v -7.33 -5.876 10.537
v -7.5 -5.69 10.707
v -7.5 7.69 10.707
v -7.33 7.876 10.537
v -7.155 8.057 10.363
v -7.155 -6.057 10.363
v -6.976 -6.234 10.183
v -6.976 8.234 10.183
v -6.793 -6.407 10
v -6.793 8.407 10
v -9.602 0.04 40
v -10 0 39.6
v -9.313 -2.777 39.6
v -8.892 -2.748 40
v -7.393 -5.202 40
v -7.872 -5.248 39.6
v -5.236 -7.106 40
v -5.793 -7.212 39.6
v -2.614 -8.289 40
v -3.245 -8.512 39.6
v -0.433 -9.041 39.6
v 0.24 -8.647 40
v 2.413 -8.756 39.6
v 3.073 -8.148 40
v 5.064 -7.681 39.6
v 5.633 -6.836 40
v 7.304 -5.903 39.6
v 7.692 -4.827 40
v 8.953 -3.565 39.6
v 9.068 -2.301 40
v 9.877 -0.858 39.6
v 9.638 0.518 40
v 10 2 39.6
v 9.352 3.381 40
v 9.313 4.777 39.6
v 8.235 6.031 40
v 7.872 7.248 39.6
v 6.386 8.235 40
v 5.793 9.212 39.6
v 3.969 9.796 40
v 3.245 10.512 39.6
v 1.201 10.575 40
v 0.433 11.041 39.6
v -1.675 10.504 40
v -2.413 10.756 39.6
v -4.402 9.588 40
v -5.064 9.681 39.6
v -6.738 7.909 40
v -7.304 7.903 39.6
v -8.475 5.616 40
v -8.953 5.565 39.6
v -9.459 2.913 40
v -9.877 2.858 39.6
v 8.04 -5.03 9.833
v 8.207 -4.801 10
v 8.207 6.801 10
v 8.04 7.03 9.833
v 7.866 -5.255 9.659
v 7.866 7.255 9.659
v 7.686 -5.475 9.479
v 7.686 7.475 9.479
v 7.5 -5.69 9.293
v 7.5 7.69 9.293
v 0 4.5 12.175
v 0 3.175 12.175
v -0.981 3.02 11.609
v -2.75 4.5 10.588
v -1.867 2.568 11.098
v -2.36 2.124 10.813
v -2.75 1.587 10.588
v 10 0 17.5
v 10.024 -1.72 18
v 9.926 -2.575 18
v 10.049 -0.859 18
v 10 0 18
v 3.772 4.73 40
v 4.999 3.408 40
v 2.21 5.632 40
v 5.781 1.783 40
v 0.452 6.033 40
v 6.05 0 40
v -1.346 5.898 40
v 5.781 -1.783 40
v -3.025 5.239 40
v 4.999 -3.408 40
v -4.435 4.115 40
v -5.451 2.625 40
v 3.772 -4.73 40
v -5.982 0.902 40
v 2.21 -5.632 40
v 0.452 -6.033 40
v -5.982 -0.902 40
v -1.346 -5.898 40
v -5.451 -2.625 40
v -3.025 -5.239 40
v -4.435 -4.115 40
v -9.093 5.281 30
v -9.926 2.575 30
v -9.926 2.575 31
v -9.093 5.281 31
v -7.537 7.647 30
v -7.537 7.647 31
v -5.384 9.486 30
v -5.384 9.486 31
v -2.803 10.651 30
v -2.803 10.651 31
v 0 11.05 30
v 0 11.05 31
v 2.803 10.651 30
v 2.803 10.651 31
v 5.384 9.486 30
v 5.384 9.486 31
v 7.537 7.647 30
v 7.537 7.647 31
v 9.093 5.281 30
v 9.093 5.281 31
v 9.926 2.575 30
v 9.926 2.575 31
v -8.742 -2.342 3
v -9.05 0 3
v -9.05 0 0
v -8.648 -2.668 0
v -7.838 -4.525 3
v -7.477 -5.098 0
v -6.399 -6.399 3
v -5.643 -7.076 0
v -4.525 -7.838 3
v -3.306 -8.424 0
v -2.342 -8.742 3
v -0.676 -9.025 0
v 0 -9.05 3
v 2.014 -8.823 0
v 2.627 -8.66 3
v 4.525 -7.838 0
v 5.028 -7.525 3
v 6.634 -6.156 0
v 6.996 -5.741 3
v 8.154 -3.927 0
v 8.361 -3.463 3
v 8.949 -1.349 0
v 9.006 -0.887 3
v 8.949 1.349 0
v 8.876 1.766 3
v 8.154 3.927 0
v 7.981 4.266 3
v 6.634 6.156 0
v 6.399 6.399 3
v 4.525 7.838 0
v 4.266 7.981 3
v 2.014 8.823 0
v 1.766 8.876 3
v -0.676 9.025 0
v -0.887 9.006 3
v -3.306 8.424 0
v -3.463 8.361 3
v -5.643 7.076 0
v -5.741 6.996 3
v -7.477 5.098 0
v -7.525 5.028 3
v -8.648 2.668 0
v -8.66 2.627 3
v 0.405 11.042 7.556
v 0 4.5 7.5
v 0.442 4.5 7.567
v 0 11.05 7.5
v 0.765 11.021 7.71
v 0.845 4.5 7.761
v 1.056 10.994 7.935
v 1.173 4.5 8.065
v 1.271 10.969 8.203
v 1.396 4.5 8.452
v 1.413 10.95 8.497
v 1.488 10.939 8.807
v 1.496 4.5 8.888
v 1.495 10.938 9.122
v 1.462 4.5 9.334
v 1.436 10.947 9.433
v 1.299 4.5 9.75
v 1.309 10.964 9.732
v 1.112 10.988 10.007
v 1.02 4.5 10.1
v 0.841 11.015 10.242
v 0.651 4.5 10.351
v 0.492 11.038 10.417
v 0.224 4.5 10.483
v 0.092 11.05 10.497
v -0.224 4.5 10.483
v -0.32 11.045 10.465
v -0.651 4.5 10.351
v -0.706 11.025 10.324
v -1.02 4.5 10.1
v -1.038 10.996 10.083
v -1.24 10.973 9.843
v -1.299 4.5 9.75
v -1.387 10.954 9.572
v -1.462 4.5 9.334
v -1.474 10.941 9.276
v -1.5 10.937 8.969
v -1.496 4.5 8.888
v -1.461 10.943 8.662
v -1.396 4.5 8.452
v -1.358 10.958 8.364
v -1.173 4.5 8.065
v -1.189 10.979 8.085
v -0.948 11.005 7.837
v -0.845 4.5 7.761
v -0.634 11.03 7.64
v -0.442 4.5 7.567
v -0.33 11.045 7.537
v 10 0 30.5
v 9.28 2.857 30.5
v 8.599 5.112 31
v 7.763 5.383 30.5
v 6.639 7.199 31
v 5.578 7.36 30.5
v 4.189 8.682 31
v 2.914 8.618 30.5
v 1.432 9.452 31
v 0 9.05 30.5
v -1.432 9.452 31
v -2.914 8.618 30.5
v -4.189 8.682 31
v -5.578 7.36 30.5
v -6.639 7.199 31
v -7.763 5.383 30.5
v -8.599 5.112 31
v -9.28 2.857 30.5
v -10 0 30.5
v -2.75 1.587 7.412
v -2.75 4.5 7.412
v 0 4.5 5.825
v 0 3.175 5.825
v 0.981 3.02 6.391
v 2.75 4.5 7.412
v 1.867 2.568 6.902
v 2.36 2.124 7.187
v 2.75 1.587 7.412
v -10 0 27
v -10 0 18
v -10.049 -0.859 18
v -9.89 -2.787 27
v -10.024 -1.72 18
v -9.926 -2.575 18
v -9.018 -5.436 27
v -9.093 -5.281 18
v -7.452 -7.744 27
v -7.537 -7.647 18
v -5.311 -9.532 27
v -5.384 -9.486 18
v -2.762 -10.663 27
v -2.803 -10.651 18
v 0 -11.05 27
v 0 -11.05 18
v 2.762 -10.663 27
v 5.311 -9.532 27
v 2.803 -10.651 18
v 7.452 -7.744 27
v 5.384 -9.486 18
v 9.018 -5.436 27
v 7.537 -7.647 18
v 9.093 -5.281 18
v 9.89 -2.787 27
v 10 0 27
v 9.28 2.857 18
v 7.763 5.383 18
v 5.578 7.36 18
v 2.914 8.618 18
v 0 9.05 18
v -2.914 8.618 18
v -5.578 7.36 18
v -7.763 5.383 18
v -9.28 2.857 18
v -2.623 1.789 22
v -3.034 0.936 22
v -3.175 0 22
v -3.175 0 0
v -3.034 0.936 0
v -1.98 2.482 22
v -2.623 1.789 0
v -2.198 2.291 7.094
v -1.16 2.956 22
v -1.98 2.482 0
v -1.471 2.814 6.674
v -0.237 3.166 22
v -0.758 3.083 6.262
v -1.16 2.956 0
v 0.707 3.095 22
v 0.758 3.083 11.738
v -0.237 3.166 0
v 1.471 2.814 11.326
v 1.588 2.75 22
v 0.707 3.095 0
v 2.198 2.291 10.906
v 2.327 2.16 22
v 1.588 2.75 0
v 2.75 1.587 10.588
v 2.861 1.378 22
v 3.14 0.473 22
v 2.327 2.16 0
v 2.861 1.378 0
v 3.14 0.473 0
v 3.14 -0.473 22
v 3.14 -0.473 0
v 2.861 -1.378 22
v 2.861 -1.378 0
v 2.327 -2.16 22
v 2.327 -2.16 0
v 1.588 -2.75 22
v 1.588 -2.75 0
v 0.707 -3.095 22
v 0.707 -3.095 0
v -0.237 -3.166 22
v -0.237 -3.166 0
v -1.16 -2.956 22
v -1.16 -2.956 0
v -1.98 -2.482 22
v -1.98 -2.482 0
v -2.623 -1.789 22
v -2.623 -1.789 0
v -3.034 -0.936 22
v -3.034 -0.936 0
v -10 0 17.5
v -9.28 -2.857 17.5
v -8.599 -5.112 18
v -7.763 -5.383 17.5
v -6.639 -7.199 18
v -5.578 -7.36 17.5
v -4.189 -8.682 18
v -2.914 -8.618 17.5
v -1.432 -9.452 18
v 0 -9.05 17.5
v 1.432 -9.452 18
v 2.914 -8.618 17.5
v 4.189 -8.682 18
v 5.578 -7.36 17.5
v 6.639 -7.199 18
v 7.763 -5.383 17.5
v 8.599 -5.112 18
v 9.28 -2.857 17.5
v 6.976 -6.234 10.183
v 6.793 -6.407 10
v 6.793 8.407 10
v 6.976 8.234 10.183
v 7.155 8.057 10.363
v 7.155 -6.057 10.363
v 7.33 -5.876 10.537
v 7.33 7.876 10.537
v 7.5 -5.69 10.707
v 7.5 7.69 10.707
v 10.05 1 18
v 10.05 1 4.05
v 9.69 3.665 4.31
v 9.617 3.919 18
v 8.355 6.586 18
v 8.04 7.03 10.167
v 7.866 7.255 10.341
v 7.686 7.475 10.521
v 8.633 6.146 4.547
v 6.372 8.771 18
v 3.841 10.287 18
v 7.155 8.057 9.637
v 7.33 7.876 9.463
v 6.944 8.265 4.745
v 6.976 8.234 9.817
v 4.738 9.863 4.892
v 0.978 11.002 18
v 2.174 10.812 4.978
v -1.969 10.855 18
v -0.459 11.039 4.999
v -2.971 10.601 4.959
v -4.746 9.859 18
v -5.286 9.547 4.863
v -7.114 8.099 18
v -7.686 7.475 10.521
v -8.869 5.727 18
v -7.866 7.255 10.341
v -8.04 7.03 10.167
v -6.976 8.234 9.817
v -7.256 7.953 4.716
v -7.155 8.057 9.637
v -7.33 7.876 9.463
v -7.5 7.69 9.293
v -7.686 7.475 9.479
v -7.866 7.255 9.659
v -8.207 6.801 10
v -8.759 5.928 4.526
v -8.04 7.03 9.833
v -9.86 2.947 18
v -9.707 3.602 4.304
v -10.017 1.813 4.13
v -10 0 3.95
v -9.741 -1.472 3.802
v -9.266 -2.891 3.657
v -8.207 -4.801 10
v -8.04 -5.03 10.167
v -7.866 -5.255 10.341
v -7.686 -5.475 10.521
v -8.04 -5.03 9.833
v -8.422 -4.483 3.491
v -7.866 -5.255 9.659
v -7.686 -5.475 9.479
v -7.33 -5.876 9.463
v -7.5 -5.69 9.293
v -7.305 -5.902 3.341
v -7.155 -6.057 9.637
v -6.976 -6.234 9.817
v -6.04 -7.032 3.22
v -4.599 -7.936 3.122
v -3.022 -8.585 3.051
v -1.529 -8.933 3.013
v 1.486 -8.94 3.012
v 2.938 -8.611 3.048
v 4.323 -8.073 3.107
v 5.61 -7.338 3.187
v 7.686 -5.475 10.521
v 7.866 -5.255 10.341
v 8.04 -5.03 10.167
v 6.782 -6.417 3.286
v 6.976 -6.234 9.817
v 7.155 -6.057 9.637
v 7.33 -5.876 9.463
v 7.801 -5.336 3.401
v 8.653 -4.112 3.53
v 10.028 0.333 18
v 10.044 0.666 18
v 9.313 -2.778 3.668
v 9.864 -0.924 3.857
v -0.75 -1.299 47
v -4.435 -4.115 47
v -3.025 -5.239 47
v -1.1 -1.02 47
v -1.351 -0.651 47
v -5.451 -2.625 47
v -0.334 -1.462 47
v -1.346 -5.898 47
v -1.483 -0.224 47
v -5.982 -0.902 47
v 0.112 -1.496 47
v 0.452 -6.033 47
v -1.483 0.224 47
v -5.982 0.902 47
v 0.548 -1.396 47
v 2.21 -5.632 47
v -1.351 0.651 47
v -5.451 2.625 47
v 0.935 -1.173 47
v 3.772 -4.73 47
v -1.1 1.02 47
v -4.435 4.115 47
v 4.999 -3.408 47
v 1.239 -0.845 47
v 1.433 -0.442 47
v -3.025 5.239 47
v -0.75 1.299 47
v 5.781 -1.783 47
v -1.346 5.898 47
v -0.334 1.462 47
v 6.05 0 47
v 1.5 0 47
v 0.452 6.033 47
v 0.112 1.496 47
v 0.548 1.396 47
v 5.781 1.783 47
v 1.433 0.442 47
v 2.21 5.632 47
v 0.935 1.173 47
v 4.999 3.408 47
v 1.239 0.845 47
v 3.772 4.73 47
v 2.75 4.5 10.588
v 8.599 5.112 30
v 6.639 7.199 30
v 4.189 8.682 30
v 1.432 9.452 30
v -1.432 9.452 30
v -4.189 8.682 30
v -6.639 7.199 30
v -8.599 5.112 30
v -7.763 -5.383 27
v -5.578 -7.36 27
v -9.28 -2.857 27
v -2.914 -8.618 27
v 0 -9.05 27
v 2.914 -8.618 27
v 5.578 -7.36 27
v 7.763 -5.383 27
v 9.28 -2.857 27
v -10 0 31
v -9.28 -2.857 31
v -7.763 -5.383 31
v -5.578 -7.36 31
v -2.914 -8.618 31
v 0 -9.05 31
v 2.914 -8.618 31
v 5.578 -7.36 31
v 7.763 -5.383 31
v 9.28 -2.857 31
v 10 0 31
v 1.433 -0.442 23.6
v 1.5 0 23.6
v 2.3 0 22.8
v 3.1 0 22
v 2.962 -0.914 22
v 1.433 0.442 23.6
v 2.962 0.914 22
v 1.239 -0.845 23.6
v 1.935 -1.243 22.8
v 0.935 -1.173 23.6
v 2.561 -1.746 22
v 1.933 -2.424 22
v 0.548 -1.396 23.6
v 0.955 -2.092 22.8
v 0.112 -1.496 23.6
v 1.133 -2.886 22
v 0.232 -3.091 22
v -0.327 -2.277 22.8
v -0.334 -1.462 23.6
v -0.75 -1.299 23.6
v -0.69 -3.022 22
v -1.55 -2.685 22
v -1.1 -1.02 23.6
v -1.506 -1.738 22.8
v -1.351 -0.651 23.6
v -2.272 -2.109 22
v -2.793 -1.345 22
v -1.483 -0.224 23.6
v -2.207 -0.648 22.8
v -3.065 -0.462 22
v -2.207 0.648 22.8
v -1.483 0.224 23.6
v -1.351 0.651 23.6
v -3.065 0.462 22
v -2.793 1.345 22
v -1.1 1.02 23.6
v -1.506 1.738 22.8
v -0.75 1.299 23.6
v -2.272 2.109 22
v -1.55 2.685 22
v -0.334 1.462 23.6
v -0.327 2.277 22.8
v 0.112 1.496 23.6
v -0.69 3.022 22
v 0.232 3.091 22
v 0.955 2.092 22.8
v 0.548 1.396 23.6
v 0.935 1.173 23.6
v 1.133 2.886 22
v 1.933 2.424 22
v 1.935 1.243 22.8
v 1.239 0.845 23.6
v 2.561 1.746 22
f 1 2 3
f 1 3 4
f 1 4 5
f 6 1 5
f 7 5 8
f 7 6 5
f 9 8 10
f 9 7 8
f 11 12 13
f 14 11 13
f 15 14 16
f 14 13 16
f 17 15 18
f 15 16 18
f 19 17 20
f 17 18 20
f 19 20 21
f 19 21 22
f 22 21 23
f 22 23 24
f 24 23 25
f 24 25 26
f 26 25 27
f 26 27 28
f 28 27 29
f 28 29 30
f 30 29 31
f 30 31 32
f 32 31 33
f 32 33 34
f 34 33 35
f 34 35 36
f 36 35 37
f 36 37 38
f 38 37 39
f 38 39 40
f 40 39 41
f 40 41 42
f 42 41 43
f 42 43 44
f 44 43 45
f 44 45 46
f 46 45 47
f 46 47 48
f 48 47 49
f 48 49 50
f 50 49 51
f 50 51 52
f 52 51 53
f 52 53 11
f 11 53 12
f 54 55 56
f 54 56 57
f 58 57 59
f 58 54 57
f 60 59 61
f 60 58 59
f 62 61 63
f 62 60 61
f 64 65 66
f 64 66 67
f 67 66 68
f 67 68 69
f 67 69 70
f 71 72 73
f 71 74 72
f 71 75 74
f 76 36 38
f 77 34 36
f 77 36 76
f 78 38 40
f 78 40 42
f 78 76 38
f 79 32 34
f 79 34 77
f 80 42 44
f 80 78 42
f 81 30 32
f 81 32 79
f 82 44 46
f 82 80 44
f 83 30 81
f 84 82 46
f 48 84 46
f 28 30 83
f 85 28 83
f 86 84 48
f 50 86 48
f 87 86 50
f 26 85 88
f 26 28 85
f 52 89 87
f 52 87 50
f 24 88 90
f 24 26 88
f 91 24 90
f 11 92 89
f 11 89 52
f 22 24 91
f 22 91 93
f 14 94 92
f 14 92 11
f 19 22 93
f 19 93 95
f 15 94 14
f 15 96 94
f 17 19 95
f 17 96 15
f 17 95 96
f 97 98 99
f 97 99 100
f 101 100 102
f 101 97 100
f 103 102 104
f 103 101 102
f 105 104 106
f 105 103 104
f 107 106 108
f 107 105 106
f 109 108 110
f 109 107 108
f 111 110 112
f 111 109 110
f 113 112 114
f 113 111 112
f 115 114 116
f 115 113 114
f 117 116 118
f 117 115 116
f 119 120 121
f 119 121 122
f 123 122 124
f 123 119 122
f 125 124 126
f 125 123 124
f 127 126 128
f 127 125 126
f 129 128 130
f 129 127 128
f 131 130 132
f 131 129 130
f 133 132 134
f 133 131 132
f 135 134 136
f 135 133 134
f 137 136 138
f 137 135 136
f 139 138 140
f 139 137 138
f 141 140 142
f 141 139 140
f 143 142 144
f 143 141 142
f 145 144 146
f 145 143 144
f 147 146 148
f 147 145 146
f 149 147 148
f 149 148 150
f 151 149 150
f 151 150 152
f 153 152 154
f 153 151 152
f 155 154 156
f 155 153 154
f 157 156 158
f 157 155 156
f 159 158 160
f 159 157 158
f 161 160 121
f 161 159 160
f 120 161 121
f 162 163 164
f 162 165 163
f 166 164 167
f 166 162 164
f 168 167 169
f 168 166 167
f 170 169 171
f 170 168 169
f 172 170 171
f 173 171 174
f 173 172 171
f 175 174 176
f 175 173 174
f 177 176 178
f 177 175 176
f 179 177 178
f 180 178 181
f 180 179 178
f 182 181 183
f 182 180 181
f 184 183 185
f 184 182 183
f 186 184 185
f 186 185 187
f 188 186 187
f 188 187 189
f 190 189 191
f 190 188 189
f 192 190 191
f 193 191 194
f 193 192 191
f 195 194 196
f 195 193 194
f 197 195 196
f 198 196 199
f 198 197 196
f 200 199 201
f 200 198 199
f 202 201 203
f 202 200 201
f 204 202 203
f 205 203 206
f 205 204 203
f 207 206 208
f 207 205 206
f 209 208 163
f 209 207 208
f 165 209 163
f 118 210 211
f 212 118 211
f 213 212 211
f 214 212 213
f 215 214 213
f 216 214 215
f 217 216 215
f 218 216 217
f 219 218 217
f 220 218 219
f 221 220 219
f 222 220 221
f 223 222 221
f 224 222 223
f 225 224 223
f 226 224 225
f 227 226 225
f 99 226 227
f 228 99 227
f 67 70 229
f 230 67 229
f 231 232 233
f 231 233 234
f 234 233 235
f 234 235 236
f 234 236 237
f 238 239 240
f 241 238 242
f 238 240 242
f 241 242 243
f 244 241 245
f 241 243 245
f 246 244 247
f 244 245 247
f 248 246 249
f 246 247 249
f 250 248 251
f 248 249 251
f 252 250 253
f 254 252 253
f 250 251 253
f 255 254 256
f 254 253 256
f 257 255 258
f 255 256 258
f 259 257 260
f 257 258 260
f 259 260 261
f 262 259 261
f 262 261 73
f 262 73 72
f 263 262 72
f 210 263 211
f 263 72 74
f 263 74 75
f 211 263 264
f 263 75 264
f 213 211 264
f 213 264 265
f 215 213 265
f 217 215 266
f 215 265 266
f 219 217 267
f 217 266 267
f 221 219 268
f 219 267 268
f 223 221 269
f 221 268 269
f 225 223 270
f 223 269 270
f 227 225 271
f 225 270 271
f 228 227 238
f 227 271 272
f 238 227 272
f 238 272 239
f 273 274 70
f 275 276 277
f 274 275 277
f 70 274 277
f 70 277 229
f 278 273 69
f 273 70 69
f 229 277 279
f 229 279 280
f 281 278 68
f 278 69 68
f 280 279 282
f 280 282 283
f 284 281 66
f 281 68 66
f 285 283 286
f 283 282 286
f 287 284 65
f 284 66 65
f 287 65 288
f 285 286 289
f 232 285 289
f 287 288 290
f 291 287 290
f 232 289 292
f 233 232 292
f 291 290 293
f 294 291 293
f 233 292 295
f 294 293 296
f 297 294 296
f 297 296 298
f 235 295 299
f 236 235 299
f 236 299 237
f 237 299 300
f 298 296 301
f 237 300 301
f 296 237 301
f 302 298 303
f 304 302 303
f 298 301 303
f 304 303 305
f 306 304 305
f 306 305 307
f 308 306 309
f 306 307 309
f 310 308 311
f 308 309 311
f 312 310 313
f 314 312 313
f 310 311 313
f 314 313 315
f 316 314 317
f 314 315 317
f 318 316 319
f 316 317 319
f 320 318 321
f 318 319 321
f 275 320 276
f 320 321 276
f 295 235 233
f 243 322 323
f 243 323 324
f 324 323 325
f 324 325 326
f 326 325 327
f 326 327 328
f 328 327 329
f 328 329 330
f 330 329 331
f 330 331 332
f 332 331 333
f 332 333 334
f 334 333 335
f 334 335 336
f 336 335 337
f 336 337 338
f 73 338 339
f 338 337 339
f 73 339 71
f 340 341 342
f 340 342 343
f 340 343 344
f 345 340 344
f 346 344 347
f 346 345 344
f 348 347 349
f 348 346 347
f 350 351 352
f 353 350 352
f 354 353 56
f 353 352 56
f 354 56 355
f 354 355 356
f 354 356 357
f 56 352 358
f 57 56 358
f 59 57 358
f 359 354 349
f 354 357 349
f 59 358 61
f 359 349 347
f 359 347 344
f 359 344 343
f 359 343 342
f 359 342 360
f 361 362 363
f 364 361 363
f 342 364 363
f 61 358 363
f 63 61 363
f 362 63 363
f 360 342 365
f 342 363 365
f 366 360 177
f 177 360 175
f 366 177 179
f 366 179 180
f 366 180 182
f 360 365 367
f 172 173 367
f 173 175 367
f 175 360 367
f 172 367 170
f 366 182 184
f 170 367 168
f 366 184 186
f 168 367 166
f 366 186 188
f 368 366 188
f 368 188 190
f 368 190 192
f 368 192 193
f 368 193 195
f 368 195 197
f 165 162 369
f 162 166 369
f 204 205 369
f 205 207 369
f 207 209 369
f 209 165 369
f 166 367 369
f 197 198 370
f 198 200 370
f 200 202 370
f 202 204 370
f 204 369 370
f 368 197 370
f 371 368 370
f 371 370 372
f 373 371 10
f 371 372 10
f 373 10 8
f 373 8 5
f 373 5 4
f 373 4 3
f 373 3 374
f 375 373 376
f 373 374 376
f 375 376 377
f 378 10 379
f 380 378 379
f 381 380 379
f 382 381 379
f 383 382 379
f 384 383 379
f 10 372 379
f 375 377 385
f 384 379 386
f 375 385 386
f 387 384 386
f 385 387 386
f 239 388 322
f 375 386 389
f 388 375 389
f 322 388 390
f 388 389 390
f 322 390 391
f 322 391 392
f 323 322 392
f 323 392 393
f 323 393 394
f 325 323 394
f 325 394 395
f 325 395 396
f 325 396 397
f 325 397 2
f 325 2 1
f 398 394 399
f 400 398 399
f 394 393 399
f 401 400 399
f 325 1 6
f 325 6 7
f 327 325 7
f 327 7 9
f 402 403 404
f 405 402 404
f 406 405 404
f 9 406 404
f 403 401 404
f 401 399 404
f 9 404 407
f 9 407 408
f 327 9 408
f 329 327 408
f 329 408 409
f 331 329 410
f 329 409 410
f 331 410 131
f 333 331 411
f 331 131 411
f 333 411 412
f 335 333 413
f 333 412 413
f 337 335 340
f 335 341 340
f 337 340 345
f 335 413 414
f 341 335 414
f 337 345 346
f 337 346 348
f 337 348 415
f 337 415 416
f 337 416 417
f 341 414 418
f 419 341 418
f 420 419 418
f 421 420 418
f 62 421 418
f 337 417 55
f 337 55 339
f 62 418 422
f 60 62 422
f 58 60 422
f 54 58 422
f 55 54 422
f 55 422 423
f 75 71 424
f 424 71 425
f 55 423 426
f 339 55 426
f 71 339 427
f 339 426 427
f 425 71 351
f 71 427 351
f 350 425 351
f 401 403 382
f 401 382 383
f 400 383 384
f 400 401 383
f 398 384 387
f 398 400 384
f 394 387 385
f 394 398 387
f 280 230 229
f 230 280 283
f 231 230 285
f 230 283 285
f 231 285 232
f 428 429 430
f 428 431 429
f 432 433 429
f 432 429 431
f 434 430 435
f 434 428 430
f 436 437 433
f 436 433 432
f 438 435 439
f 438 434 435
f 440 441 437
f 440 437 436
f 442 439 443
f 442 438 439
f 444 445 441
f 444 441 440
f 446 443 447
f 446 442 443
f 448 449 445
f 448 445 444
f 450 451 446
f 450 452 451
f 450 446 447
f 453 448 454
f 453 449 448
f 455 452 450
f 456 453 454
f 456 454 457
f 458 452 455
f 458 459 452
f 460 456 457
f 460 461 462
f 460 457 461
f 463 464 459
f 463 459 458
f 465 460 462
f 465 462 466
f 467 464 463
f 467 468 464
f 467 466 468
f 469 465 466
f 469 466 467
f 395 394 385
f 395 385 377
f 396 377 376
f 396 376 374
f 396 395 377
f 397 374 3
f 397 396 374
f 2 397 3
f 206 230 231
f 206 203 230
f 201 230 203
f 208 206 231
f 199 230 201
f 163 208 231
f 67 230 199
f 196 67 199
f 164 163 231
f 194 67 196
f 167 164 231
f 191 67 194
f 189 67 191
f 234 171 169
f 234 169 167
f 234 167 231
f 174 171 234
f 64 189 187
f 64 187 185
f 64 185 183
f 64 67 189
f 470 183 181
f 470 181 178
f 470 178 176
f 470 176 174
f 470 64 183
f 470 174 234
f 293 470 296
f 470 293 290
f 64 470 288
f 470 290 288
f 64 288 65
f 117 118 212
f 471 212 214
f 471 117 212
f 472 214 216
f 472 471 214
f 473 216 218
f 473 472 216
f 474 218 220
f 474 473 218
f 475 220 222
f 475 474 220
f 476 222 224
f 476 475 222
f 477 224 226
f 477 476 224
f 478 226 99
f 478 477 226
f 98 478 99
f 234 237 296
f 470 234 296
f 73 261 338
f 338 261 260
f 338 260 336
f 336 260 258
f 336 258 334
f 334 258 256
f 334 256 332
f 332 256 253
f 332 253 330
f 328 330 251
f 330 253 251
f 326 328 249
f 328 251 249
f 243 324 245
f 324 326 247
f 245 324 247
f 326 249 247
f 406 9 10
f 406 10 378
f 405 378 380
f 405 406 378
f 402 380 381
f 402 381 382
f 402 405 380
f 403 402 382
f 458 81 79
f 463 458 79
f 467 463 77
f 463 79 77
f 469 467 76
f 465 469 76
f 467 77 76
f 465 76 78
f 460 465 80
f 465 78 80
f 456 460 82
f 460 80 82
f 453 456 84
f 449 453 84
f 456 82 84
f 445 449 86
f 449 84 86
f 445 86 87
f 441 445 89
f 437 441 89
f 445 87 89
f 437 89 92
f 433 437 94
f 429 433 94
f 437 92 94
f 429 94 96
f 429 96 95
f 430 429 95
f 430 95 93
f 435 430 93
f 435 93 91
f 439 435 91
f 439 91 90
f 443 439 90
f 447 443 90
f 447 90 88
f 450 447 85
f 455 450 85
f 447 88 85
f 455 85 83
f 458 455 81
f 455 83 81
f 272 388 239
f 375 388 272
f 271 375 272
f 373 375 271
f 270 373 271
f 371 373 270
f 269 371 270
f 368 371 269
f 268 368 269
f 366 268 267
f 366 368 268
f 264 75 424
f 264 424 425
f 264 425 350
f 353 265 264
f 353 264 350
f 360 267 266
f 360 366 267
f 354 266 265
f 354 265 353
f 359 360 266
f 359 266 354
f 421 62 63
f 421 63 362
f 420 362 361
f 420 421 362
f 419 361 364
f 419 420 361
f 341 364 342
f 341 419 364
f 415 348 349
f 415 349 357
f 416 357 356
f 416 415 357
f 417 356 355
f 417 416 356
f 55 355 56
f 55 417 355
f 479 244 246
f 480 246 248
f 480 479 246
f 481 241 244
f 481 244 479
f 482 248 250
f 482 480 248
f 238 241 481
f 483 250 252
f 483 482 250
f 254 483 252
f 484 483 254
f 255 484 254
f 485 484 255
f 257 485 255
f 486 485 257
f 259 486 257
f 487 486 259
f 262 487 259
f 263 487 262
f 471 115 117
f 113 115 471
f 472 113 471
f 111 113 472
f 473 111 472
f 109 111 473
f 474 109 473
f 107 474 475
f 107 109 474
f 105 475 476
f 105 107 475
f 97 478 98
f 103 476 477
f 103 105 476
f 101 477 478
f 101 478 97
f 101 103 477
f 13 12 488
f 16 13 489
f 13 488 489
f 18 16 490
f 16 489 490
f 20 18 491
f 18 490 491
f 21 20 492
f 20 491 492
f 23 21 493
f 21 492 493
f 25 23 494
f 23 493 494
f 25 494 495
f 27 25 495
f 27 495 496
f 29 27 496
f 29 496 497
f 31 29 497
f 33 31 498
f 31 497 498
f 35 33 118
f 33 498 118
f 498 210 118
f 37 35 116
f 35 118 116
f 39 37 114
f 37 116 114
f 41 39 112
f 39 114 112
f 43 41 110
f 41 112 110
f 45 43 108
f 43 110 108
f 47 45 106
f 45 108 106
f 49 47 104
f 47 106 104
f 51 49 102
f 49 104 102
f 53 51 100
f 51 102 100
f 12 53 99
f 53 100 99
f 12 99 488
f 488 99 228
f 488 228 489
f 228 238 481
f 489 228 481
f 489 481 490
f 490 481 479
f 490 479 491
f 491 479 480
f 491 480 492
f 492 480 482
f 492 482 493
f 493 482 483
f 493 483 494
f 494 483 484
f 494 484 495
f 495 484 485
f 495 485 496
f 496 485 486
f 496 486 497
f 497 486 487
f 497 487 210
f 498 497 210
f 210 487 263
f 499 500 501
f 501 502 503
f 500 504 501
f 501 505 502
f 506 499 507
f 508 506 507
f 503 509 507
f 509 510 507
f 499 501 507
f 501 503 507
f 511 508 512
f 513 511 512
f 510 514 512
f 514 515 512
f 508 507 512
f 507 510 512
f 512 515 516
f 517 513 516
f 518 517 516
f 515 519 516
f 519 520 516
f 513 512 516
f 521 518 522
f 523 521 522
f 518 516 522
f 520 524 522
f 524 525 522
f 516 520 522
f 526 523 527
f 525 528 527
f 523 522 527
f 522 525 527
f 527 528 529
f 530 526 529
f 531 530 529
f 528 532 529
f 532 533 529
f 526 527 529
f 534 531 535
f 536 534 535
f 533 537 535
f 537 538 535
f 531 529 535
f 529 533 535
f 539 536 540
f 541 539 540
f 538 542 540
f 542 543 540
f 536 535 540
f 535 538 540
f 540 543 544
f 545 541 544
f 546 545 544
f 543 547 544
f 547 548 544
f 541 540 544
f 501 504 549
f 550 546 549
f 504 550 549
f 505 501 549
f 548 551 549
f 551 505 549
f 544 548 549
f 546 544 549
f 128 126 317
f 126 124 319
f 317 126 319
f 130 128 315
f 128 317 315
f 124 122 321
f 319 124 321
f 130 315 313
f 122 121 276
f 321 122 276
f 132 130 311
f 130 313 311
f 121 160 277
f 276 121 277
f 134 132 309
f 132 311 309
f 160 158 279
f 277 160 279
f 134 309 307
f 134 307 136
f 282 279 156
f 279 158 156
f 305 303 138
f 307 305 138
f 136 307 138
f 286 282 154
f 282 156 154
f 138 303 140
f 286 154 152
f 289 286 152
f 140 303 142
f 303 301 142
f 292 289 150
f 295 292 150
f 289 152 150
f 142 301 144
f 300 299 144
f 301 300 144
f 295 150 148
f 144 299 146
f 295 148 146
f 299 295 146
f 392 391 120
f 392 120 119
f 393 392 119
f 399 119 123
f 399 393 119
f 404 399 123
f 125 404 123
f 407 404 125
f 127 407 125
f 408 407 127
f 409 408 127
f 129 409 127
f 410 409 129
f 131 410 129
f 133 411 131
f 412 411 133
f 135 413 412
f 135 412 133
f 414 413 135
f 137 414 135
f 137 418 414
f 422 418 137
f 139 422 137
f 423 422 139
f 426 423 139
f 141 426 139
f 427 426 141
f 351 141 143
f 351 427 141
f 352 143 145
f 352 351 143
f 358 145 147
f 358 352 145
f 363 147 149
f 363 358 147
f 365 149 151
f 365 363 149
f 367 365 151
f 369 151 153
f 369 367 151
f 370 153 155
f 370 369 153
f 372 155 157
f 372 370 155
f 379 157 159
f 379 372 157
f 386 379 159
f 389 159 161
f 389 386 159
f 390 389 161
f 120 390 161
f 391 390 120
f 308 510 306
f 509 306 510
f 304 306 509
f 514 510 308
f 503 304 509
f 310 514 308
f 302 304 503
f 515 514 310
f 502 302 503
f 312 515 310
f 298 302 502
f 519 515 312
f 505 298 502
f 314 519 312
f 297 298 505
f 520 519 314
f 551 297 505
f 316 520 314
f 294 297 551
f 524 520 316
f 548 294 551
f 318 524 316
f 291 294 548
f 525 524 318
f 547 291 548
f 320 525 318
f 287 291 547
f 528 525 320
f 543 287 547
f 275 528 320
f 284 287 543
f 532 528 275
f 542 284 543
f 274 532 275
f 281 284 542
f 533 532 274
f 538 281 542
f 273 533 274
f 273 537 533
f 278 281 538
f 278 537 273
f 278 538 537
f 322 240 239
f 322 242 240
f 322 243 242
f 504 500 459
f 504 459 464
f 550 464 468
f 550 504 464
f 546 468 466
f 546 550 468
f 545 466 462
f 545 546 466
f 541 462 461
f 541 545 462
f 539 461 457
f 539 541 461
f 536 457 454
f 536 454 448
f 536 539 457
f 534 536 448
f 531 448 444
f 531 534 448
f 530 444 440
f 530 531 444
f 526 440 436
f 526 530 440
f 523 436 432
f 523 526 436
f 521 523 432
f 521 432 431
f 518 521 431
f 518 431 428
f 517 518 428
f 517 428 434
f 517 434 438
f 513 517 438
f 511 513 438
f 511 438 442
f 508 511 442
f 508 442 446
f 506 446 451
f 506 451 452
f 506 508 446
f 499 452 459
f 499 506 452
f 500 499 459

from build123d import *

# Parameters (mm, degrees)
SKETCH1_R             = 10.05
SKETCH1_R_2           = 1.5
EXTRUSION1_DEPTH      = 18
SKETCH2_R             = 10.05
SKETCH2_R_2           = 1.5
EXTRUSION2_DEPTH      = 13
SKETCH3_R             = 10.05
SKETCH3_R_2           = 1.5
EXTRUSION3_DEPTH      = 9
EXTRUSION4_START      = -4
EXTRUSION4_DEPTH      = 4
SKETCH5_R             = 6.05
SKETCH5_R_2           = 1.5
EXTRUSION5_DEPTH      = 7
SKETCH6_R             = 3.175
SKETCH6_R_2           = 1.5
EXTRUSION6_DEPTH      = 22
EXTRUSION7_DEPTH      = 4.5
SKETCH8_W             = 1.5
SKETCH8_H             = 11.05
EXTRUSION8_DEPTH      = 50.316376633
EXTRUSION8_DEPTH_BACK = 50.316376633
CHAMFER1_SIZE         = 0.4
SKETCH12_W            = 4
SKETCH12_H            = 3
CHAMFER2_SIZE         = 1.6
CHAMFER3_SIZE         = 0.5
CHAMFER4_SIZE         = 0.5
EXTRUSION10_START     = 1
EXTRUSION10_DEPTH     = 1


with BuildPart() as part:
    # Sketch1 → Extrusion1 (new body)
    with BuildSketch(Plane.XY):
        with Locations((0, 1)):
            Circle(SKETCH1_R)
        Circle(SKETCH1_R_2, mode=Mode.SUBTRACT)
    extrude(amount=EXTRUSION1_DEPTH)

    # Sketch2 → Extrusion2 (add)
    with BuildSketch(Plane(origin=(0, 1, 18), x_dir=(1, 0, 0), z_dir=(0, 0, 1))):
        with Locations(Location((0, -2, 0), (0, 0, 174.289477772))):
            Circle(SKETCH2_R)
        with Locations((0, -1)):
            Circle(SKETCH2_R_2, mode=Mode.SUBTRACT)
    extrude(amount=EXTRUSION2_DEPTH)

    # Sketch3 → Extrusion3 (add)
    with BuildSketch(Plane(origin=(0, -1, 31), x_dir=(1, 0, 0), z_dir=(0, 0, 1))):
        with Locations(Location((0, 2, 0), (0, 0, 185.710522228))):
            Circle(SKETCH3_R)
        with Locations((0, 1)):
            Circle(SKETCH3_R_2, mode=Mode.SUBTRACT)
    extrude(amount=EXTRUSION3_DEPTH)

    # Sketch4 → Extrusion4 (cut)
    with BuildSketch(Plane(origin=(0, 1, 31), x_dir=(1, 0, 0), z_dir=(0, 0, 1)).offset(EXTRUSION4_START)):
        with BuildLine():
            ThreePointArc((-10.000124999, -1), (0, -12.05), (10.000124999, -1))
            ThreePointArc((10.000124999, -1), (0, -10.05), (-10.000124999, -1))
        make_face()
    extrude(amount=EXTRUSION4_DEPTH, mode=Mode.SUBTRACT)

    # Sketch5 → Extrusion5 (add)
    with BuildSketch(Plane(origin=(0, 1, 40), x_dir=(1, 0, 0), z_dir=(0, 0, 1))):
        with Locations((0, -1)):
            Circle(SKETCH5_R)
        with Locations((0, -1)):
            Circle(SKETCH5_R_2, mode=Mode.SUBTRACT)
    extrude(amount=EXTRUSION5_DEPTH)

    # Sketch6 → Extrusion6 (cut)
    with BuildSketch(Plane(origin=(0, 1, 0), x_dir=(-1, 0, 0), z_dir=(0, 0, -1))):
        with Locations((0, -1)):
            Circle(SKETCH6_R)
        with Locations((0, -1)):
            Circle(SKETCH6_R_2, mode=Mode.SUBTRACT)
    extrude(amount=-EXTRUSION6_DEPTH, mode=Mode.SUBTRACT)

    # Sketch7 → Extrusion7 (cut)
    with BuildSketch(Plane(origin=(0, 0, 0), x_dir=(-1, 0, 0), z_dir=(0, 1, 0))):
        Polygon((-2.75, 7.41228676), (-2.75, 10.58771324), (0, 12.175426481), (2.75, 10.58771324), (2.75, 7.41228676), (0, 5.824573519), align=None)
    extrude(amount=EXTRUSION7_DEPTH, mode=Mode.SUBTRACT)

    # Sketch8 → Hole2 (revolve, cut)
    with BuildSketch(Plane(origin=(0, 0, 9), x_dir=(0, 0, -1), z_dir=(1, 0, 0))):
        with Locations((0.75, 5.525)):
            Rectangle(SKETCH8_W, SKETCH8_H)
    revolve(axis=Axis((0, 110, 9), (0, -1, 0)), mode=Mode.SUBTRACT)

    # Sketch10 → Extrusion8 (cut, two sides: drawn at the far end of the back side and taken through both)
    with BuildSketch(Plane(origin=(0, 0, 0), x_dir=(-1, 0, 0), z_dir=(0, 1, 0)).offset(-EXTRUSION8_DEPTH_BACK)):
        Polygon((-7.5, 10.707106781), (-8.207106781, 10), (-7.5, 9.292893219), (-6.792893219, 10), align=None)
        Polygon((7.5, 10.707106781), (6.792893219, 10), (7.5, 9.292893219), (8.207106781, 10), align=None)
    extrude(amount=EXTRUSION8_DEPTH + EXTRUSION8_DEPTH_BACK, mode=Mode.SUBTRACT)

    # Chamfer1
    chamfer1_edges = [part.edges().sort_by_distance(p)[0] for p in [
        (10.000124999, 2, 40),
    ]]
    chamfer(chamfer1_edges, length=CHAMFER1_SIZE)

    # Sketch12 → Revolution1 (revolve, cut)
    with BuildSketch(Plane.YZ, mode=Mode.PRIVATE) as revolution1_sk:
        with Locations((-11.05, 1.5)):
            Rectangle(SKETCH12_W, SKETCH12_H)
        Polygon((-9.05, 3), (-13.05, 7), (-13.05, 3), align=None)
    revolve(revolution1_sk.sketch.rotate(Axis((0, 0, -4.4), (0, 0, 1)), 270), axis=Axis((0, 0, -4.4), (0, 0, 1)), mode=Mode.SUBTRACT)

    # Chamfer2
    chamfer2_edges = [part.edges().sort_by_distance(p)[0] for p in [
        (-1.5, 0, 22),
    ]]
    chamfer(chamfer2_edges, length=CHAMFER2_SIZE)

    # Chamfer3
    # the kernel refuses this chamfer: 0.5 mm, written as the material it adds along each edge
    with BuildSketch(Plane(origin=(0, -1, 31), x_dir=(0.9995951137043791, -0.028453622938550055, 0), z_dir=(-0.028453622938550055, -0.9995951137043791, 0))) as chamfer3_piece_1_section:
        Polygon((10.05, -CHAMFER3_SIZE), (10.05 + CHAMFER3_SIZE, 0), (10.05, 0), align=None)
    chamfer3_piece_1 = revolve(axis=Axis((0, -1, 31), (0, 0, 1)), revolution_arc=183.260985134, mode=Mode.PRIVATE)
    chamfer3_piece_1 = chamfer3_piece_1 & Plane(origin=(0, 1, 30.761134514), x_dir=(-0.9950373133554516, -0.09950248755867733, 0), z_dir=(0, 0, -1)) * Cylinder(10.05, 43, mode=Mode.PRIVATE)
    add(chamfer3_piece_1)

    # Chamfer4
    # the kernel refuses this chamfer: 0.5 mm, written as the material it adds along each edge
    with BuildSketch(Plane(origin=(0, 1, 18), x_dir=(-0.9995951137044771, 0.028453622935110102, 0), z_dir=(0.028453622935110102, 0.9995951137044771, 0))) as chamfer4_piece_1_section:
        Polygon((10.05 + CHAMFER4_SIZE, 0), (10.05, -CHAMFER4_SIZE), (10.05, 0), align=None)
    chamfer4_piece_1 = revolve(axis=Axis((0, 1, 18), (0, 0, 1)), revolution_arc=183.260985134, mode=Mode.PRIVATE)
    chamfer4_piece_1 = chamfer4_piece_1 & Plane(origin=(0, -1, 17.760783503), x_dir=(-0.9950373133554516, 0.09950248755867756, 0), z_dir=(0, 0, -1)) * Cylinder(10.05, 43, mode=Mode.PRIVATE)
    add(chamfer4_piece_1)

    # Sketch13 → Extrusion10 (add)
    with BuildSketch(Plane(origin=(0, -1, 31), x_dir=(-1, 0, 0), z_dir=(0, 0, -1)).offset(EXTRUSION10_START)):
        with BuildLine():
            ThreePointArc((9.925818606, 3.575), (0, 12.05), (-9.925818606, 3.575))
            ThreePointArc((-9.925818606, 3.575), (0, 10.55), (9.925818606, 3.575))
        make_face()
    extrude(amount=-EXTRUSION10_DEPTH)


solid = part.part
